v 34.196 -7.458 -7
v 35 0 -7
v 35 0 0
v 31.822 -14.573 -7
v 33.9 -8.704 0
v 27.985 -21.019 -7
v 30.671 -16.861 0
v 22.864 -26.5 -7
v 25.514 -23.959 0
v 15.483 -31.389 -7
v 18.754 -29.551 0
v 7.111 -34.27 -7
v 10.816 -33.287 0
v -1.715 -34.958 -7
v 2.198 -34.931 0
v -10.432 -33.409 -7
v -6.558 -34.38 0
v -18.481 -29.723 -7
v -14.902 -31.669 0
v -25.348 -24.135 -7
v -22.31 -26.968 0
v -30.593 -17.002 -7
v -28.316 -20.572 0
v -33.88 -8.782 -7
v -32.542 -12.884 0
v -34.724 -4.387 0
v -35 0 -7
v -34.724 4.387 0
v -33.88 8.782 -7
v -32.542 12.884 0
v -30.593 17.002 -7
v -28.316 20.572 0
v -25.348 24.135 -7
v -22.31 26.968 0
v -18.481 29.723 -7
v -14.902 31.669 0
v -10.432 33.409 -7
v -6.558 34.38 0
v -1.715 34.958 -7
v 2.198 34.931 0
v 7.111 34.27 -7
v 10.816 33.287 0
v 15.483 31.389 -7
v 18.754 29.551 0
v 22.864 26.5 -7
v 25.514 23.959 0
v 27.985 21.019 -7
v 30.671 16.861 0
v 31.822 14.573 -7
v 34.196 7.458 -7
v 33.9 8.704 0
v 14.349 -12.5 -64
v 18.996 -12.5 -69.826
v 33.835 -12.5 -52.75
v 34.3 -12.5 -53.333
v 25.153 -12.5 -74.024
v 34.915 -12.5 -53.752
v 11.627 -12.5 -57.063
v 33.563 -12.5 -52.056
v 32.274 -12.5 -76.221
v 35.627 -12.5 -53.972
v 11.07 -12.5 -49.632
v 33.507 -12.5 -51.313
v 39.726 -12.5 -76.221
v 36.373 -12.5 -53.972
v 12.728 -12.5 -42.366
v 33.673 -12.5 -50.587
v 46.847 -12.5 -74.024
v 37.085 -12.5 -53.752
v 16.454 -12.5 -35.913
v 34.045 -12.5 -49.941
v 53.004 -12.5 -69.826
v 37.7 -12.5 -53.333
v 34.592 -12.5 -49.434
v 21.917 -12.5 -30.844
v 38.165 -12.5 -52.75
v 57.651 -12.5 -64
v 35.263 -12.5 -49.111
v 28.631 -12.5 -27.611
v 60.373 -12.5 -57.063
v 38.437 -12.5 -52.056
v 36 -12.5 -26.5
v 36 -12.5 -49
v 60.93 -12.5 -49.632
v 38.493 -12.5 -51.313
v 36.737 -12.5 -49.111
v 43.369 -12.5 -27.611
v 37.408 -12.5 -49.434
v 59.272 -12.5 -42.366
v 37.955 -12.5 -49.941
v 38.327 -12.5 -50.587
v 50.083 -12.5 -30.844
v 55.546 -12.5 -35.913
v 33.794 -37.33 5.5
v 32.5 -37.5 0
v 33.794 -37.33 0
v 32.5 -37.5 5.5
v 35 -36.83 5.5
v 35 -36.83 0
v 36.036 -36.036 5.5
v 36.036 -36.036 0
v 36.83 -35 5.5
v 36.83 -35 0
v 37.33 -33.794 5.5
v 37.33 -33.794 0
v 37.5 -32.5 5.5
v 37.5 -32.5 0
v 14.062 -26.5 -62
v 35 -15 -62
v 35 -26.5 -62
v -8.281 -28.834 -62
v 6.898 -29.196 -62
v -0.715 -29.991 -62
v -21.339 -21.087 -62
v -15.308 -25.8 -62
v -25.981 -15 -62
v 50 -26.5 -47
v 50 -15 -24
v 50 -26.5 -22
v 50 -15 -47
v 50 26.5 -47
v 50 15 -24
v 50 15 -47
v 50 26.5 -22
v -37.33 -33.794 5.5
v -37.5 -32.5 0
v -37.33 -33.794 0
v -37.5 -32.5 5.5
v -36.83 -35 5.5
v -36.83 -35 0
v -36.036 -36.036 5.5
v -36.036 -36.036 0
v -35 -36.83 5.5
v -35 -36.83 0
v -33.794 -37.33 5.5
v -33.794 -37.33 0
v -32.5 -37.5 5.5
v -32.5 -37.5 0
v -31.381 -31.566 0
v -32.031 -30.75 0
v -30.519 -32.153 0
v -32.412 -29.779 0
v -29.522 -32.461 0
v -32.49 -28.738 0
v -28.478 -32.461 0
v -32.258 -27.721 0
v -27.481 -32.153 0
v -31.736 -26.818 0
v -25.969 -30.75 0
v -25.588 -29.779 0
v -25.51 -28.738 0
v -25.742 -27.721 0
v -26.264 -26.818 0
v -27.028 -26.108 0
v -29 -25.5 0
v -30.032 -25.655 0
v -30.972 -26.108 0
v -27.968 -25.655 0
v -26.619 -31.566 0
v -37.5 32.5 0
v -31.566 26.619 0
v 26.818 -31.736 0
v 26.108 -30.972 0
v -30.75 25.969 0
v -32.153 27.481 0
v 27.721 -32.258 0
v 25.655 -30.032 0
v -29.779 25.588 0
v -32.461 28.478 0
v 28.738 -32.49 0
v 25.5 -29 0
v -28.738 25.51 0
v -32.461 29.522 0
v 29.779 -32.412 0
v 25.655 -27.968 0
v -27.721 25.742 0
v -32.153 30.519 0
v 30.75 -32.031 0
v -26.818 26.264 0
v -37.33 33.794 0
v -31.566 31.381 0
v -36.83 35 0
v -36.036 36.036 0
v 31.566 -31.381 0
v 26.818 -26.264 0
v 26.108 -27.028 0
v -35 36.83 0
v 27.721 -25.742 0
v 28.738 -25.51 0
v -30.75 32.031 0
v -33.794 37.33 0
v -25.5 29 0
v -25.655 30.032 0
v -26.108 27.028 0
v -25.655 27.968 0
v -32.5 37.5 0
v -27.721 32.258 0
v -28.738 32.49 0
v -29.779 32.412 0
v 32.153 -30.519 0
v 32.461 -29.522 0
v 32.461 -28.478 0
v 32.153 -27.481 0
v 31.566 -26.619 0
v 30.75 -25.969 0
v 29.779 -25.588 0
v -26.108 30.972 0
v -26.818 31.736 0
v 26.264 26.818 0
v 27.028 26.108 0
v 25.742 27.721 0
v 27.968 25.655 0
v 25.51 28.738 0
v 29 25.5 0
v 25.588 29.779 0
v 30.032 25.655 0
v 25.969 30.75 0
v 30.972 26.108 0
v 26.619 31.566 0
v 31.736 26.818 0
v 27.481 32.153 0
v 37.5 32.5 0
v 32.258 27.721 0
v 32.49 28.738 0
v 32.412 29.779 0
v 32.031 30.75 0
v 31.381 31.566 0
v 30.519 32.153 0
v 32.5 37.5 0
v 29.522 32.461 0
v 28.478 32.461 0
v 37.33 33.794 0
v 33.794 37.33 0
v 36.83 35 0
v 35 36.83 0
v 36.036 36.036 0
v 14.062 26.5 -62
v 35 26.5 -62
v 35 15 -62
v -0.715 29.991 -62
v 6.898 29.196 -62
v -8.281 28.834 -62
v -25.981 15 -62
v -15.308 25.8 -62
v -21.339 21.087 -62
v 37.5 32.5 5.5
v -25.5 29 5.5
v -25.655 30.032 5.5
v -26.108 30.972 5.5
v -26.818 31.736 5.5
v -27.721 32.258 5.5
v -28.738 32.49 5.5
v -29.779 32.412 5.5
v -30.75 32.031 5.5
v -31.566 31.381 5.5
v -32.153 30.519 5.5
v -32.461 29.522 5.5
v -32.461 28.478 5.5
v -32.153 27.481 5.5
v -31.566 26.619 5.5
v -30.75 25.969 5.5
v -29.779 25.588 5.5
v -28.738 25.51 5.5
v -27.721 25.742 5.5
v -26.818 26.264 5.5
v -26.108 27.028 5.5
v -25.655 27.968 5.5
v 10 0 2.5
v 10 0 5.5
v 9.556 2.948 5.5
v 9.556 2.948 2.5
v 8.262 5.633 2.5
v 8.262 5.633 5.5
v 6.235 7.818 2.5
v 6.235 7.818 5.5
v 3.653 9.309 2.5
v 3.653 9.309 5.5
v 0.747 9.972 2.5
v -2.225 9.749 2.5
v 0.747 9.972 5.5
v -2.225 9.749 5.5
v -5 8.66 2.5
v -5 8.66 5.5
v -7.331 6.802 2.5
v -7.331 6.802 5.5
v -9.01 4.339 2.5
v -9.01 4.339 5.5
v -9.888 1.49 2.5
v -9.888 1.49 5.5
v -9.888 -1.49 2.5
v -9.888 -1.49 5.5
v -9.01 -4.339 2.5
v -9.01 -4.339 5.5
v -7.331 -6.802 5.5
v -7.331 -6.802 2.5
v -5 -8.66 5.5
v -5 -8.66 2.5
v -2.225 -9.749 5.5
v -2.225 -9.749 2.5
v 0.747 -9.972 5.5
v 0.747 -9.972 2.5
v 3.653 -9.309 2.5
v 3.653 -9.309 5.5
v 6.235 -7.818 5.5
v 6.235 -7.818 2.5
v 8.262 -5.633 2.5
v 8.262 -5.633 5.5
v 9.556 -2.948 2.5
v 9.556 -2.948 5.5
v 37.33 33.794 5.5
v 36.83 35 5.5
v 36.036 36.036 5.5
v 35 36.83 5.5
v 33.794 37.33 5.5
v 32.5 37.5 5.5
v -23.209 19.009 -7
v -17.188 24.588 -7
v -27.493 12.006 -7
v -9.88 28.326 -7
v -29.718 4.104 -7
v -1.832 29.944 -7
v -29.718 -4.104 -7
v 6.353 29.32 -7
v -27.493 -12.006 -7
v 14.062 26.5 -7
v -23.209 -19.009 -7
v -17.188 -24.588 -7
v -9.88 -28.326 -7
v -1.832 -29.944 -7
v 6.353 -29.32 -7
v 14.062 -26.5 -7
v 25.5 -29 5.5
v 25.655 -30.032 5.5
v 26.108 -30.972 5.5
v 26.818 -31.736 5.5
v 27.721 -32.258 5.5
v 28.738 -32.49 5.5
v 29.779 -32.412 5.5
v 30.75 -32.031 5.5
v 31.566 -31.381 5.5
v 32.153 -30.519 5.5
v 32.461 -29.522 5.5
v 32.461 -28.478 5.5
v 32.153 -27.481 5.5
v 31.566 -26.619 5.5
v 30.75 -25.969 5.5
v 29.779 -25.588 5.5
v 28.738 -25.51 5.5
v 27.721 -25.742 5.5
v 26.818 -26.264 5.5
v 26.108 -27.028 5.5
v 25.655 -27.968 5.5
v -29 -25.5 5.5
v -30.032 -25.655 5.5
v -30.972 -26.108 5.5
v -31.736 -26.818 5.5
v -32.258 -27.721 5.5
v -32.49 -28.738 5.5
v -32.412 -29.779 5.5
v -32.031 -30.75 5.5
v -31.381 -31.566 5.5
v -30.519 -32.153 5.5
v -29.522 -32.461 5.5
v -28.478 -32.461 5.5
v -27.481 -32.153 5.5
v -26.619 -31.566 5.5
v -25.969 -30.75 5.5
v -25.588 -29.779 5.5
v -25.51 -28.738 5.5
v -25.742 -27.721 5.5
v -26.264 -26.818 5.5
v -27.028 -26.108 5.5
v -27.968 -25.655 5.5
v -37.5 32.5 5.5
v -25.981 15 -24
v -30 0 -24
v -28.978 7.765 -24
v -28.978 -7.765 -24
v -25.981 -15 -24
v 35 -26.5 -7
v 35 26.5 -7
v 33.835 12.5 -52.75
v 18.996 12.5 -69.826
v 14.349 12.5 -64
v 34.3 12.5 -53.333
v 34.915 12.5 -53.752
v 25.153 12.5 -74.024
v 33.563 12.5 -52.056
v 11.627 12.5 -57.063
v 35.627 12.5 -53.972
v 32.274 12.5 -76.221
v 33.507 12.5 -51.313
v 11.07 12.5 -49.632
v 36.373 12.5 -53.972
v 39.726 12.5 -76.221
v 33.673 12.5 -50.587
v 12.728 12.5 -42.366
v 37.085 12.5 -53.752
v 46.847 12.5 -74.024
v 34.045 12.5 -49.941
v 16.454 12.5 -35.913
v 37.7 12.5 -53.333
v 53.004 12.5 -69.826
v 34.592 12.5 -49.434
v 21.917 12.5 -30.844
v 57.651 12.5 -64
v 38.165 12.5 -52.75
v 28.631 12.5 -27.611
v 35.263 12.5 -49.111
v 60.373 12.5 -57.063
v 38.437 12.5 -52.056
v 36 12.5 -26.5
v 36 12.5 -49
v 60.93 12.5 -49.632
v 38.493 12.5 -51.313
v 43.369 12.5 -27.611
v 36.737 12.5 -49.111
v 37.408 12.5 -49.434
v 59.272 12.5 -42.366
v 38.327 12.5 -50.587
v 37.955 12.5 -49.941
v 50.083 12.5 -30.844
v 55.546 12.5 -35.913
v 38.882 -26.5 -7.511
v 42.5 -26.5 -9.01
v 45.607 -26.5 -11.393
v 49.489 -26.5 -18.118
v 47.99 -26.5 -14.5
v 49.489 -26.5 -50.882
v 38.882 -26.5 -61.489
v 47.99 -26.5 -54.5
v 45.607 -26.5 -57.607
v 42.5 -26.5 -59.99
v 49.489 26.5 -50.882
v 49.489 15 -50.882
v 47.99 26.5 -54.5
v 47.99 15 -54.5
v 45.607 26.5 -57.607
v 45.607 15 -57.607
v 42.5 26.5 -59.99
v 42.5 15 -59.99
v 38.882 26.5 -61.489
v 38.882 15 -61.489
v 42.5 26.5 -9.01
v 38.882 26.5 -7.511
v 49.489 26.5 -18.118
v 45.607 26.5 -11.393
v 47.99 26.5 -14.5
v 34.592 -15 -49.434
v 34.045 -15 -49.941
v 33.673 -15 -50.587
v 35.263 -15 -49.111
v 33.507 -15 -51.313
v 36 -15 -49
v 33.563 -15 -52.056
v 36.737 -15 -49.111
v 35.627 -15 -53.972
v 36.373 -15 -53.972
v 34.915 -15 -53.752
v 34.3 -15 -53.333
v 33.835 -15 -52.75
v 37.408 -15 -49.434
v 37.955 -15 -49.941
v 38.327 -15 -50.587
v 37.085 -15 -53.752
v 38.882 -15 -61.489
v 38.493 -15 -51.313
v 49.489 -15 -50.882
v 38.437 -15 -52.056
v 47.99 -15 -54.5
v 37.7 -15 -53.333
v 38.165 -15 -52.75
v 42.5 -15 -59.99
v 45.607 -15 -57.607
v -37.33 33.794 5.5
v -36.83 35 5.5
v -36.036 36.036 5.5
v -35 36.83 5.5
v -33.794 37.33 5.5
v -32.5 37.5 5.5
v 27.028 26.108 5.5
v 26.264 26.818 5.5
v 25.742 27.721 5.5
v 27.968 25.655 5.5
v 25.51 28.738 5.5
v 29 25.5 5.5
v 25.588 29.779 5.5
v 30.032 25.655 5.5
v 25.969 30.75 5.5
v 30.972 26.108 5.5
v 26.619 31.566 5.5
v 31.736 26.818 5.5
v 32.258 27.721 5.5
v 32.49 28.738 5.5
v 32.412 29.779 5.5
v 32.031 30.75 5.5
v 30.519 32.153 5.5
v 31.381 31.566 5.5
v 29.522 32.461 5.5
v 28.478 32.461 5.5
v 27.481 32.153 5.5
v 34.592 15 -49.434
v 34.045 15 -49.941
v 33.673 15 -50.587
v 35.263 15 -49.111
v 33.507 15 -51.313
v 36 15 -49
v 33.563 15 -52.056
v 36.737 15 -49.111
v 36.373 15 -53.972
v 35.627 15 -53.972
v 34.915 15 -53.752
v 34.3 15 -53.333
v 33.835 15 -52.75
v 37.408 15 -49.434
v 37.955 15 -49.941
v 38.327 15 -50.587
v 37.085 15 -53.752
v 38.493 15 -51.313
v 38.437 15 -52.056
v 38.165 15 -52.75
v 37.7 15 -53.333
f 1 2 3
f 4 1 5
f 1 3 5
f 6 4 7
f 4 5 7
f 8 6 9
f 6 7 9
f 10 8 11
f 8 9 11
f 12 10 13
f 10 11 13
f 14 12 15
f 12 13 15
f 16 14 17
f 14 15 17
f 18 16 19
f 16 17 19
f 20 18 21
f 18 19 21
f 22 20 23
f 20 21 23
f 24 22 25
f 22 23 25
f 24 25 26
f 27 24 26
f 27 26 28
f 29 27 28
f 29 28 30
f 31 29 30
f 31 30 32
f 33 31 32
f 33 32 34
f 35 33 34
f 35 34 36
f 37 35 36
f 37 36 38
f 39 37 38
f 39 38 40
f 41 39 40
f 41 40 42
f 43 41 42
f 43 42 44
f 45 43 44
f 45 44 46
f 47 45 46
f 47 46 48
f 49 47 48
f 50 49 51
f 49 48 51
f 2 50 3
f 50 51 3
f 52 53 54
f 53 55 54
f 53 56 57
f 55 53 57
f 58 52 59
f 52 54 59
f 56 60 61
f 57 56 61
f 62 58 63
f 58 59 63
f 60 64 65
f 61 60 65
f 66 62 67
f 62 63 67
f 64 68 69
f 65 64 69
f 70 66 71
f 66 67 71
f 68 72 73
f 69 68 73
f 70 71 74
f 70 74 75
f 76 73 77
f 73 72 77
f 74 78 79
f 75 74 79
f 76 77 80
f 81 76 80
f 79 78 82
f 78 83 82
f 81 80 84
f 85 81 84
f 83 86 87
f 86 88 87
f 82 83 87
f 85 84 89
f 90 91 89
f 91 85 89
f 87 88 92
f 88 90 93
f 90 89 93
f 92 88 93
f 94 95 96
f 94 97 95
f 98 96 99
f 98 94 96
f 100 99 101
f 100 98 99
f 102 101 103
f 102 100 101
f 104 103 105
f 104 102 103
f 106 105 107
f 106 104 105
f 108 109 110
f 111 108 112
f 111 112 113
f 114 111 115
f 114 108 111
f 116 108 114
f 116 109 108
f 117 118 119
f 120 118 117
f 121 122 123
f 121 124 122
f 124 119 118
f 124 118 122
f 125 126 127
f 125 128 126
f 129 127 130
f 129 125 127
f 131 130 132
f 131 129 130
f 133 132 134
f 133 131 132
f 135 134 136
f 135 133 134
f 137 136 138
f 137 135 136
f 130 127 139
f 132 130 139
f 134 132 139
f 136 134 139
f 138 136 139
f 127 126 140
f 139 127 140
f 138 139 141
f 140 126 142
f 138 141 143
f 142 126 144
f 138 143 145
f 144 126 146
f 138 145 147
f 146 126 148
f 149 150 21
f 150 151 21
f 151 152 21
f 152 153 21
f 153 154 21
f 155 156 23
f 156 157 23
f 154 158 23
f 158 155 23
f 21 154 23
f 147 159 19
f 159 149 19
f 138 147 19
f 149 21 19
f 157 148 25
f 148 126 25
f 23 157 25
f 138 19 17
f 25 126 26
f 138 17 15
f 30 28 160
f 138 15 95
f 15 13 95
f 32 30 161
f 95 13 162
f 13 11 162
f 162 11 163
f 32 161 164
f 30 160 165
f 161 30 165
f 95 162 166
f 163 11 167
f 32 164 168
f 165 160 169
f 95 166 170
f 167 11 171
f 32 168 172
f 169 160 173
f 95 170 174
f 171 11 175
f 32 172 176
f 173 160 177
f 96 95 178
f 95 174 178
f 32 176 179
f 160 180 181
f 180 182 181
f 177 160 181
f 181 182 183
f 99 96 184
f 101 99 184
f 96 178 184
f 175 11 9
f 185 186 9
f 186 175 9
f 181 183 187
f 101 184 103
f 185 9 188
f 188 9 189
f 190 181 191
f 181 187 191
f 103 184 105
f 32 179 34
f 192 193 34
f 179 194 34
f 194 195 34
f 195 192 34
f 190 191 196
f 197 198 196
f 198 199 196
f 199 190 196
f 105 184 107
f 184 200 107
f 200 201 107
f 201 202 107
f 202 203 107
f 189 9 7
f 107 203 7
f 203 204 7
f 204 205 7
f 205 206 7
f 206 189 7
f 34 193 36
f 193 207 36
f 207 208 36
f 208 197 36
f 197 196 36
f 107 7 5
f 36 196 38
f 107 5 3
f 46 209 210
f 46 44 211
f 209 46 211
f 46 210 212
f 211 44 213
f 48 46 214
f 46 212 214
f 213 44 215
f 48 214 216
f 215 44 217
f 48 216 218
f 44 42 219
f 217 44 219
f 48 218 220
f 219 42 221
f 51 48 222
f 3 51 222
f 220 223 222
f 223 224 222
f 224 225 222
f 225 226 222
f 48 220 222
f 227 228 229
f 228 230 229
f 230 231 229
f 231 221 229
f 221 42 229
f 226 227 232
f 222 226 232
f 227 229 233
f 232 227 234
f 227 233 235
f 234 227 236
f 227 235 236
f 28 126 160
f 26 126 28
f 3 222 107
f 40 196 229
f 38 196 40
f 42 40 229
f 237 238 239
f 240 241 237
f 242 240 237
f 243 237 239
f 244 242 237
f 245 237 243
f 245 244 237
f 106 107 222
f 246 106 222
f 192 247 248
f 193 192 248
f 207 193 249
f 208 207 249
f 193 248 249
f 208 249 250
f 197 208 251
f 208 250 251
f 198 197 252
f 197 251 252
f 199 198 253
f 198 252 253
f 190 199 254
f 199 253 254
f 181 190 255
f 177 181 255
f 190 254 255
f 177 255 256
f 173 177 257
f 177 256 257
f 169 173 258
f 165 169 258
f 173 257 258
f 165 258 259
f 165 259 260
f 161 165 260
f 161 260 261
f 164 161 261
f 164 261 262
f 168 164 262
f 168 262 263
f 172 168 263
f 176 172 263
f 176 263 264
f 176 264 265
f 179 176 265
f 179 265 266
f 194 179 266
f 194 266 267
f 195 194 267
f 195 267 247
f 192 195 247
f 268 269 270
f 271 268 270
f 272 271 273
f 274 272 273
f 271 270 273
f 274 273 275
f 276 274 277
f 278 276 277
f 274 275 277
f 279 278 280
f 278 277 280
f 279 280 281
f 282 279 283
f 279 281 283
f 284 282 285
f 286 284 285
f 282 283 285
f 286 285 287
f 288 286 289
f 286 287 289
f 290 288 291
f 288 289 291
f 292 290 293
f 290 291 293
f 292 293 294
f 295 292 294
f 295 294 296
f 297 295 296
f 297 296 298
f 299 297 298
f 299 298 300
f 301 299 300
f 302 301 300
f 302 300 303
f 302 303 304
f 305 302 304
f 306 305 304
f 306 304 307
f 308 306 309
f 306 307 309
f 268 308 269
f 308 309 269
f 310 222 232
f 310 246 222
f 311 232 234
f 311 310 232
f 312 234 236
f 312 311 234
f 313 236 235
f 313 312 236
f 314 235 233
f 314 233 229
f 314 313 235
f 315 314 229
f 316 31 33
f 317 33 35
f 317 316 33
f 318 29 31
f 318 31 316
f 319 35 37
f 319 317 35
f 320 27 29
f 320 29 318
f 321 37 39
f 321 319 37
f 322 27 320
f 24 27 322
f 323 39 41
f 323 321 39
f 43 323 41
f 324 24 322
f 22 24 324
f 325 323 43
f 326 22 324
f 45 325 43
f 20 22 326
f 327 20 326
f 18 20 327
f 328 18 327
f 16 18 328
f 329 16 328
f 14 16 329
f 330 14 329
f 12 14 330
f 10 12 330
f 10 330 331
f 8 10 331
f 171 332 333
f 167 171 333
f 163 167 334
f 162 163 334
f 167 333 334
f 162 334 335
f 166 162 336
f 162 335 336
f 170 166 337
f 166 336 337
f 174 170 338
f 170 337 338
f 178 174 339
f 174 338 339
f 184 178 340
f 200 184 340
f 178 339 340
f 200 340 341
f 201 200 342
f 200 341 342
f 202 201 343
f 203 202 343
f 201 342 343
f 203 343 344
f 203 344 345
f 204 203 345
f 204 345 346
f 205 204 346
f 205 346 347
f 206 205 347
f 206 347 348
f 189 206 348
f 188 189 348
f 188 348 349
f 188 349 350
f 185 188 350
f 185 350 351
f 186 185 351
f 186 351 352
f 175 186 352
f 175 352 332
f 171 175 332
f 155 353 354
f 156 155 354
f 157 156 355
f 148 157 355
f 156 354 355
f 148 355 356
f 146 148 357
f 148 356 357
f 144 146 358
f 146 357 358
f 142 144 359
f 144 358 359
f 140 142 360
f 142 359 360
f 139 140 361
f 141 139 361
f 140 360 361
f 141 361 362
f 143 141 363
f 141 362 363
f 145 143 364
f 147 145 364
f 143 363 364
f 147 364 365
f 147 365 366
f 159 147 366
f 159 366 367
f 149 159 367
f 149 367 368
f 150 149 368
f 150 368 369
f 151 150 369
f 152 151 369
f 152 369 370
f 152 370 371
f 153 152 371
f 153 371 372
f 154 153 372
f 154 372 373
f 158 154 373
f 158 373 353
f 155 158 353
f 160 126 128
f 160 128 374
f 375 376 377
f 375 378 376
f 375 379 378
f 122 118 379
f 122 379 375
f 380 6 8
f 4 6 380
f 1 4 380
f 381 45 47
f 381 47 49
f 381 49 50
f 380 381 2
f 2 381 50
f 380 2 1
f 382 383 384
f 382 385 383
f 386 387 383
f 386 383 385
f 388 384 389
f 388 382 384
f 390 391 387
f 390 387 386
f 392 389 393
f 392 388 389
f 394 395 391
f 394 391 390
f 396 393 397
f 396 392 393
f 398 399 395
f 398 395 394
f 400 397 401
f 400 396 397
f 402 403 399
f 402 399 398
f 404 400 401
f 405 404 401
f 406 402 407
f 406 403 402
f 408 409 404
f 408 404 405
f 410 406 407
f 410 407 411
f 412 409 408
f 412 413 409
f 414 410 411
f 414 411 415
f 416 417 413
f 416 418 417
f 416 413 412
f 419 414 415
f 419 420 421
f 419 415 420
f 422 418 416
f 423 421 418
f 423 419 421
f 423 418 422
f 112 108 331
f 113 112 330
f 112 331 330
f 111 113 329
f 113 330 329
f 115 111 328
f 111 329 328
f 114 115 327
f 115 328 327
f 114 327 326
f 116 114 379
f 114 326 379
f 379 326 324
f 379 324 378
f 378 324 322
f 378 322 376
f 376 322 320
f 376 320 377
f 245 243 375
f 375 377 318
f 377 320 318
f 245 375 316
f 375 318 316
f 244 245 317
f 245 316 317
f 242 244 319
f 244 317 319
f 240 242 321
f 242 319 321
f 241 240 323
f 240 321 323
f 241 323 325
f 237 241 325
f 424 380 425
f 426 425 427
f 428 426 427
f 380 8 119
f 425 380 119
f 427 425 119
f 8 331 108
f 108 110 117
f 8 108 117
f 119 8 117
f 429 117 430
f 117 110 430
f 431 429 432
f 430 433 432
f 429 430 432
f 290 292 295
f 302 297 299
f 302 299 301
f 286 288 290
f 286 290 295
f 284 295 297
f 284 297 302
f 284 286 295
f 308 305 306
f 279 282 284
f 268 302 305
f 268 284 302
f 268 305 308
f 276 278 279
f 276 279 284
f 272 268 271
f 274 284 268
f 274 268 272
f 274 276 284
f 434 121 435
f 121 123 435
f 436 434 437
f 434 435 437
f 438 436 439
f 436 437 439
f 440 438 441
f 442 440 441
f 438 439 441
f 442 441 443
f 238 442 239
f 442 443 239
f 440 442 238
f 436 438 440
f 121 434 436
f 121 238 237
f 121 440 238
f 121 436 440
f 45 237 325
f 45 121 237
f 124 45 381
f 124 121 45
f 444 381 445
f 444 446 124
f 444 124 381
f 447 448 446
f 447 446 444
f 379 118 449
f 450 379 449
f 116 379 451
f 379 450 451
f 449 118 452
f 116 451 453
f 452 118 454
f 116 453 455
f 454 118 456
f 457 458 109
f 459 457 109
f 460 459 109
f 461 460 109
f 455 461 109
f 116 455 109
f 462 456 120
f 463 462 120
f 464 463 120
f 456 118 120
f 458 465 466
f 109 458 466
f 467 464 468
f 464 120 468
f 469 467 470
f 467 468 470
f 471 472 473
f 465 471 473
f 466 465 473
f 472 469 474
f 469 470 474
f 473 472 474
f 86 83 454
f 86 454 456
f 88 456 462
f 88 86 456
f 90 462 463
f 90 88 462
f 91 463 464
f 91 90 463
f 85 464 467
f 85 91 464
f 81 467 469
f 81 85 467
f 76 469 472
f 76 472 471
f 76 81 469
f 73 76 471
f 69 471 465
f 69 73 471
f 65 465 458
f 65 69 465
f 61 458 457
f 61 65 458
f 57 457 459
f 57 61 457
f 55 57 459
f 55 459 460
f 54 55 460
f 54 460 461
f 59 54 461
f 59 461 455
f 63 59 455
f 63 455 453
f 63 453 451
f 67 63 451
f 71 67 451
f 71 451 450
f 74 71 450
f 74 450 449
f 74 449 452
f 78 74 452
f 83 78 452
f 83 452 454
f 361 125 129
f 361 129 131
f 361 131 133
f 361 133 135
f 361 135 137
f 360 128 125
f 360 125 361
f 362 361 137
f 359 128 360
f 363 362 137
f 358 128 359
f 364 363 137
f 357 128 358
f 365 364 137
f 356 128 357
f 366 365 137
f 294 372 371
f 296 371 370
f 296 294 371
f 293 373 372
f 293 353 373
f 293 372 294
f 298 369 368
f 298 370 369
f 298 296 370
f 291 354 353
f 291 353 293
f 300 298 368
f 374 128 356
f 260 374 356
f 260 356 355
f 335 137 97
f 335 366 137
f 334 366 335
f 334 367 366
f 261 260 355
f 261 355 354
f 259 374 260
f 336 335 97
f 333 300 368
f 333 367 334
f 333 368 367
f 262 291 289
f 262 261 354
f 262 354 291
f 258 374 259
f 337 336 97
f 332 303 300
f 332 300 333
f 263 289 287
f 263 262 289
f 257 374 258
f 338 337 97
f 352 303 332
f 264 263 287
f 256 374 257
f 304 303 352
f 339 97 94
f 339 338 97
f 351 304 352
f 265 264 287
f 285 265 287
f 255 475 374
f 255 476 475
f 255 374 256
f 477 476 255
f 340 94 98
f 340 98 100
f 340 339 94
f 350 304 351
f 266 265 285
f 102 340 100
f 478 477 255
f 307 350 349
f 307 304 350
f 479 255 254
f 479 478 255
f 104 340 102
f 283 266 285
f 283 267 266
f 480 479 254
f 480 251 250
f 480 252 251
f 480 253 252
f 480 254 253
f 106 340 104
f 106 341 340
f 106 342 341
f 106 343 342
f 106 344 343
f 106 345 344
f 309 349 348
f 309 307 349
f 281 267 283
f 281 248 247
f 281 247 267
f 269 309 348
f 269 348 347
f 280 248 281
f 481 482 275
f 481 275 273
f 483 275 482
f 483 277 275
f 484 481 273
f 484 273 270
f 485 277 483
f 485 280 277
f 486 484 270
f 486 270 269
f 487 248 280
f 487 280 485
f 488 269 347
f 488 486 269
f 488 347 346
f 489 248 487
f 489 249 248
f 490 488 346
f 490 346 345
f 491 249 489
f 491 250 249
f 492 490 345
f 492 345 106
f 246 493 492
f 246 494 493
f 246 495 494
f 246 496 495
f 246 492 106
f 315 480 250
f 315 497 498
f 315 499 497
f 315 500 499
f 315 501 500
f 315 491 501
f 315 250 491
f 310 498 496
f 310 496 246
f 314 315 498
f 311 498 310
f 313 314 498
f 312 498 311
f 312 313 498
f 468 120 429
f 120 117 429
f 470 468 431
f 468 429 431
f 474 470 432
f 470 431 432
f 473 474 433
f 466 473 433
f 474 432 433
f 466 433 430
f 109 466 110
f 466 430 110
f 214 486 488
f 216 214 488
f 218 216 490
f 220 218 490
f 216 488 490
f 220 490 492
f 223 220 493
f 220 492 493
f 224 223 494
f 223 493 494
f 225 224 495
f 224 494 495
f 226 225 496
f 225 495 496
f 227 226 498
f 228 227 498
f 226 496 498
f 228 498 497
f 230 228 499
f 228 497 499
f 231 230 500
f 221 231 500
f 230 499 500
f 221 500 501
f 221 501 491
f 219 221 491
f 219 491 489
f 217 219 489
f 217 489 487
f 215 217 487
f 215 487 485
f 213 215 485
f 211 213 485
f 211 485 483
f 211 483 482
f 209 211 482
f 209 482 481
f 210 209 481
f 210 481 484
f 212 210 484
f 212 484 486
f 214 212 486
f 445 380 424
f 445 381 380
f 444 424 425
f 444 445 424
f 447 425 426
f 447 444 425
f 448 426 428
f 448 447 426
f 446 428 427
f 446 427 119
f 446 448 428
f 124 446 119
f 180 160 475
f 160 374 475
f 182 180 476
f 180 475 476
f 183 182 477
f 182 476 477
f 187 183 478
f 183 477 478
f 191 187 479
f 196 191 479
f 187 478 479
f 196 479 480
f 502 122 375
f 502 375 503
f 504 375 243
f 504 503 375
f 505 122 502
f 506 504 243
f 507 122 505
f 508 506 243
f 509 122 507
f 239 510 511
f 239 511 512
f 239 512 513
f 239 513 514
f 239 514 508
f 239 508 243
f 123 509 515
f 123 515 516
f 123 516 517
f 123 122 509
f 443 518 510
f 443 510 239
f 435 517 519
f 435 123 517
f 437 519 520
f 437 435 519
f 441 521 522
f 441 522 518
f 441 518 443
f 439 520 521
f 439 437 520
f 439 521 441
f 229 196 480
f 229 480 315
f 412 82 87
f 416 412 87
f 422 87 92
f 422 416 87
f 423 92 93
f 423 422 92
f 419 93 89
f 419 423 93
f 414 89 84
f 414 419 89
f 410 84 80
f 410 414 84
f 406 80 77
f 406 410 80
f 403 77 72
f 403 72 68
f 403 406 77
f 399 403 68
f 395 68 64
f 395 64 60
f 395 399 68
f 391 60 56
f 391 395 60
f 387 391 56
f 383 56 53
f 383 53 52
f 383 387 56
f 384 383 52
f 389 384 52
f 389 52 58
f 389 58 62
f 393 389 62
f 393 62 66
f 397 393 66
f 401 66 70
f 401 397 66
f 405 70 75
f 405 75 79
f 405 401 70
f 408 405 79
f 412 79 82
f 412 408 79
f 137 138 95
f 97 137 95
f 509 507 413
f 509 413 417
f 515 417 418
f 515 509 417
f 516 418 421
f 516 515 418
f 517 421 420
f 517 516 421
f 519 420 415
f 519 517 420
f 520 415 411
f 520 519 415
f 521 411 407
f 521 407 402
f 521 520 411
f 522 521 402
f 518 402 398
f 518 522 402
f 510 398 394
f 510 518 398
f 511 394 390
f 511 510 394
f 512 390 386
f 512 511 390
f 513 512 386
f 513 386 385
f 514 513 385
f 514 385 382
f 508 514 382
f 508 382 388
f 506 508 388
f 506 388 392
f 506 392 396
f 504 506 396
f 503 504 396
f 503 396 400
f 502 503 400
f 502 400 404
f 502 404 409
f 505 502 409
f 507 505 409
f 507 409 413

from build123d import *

# Parameters (mm, degrees)
SKETCH_1_W               = 75
SKETCH_1_H               = 75
EXTRUDE_1_DEPTH          = 5.5
FILLET_1_R               = 5
SKETCH_2_R               = 3.5
CUT_EXTRUDE_1_DEPTH      = 54.31744555
PATTERN_CIRCULAR_1_COUNT = 4
SKETCH_3_R               = 10
CUT_EXTRUDE_2_DEPTH      = 3
SKETCH_4_R               = 35
EXTRUDE_2_DEPTH          = 7
SKETCH_5_R               = 30
EXTRUDE_3_DEPTH          = 55
SKETCH_6_W               = 50
SKETCH_6_H               = 55
EXTRUDE_4_DEPTH          = 26.5
FILLET_2_R               = 15
SKETCH_7_W               = 38
SKETCH_7_H               = 30
CUT_EXTRUDE_3_DEPTH      = 114.606777967
SKETCH_9_R               = 25
EXTRUDE_5_DEPTH          = 12.5
EXTRUDE_6_REACH          = 118.916
SKETCH_8_R               = 2.5
FILLET_3_R               = 15


with BuildPart() as part:
    # 草图1 → 拉伸1 (new body)
    with BuildSketch(Plane.XY):
        Rectangle(SKETCH_1_W, SKETCH_1_H)
    extrude(amount=EXTRUDE_1_DEPTH)

    # 圆角1
    fillet_1_edges = [part.edges().sort_by_distance(p)[0] for p in [
        (-37.5, 37.5, 2.75),
        (37.5, 37.5, 2.75),
        (37.5, -37.5, 2.75),
        (-37.5, -37.5, 2.75),
    ]]
    fillet(fillet_1_edges, radius=FILLET_1_R)

    # 草图2 → 切除-拉伸1 (cut, through all)
    with BuildSketch(Plane.XY.offset(5.5)):
        with Locations((-29, 29)):
            Circle(SKETCH_2_R)
    cut_extrude_1 = extrude(amount=-CUT_EXTRUDE_1_DEPTH, mode=Mode.SUBTRACT)

    # 阵列(圆周)1: 切除-拉伸1 ×4 about axis
    pattern_circular_1_axis = Axis((0, 0, 0), (0, 0, 1))
    for i in range(1, PATTERN_CIRCULAR_1_COUNT):
        add(cut_extrude_1.rotate(pattern_circular_1_axis, i * 360 / PATTERN_CIRCULAR_1_COUNT), mode=Mode.SUBTRACT)

    # 草图3 → 切除-拉伸2 (cut)
    with BuildSketch(Plane.XY.offset(5.5)):
        Circle(SKETCH_3_R)
    extrude(amount=-CUT_EXTRUDE_2_DEPTH, mode=Mode.SUBTRACT)

    # 草图4 → 拉伸2 (add)
    with BuildSketch(Plane(origin=(0, 0, 0), x_dir=(-1, 0, 0), z_dir=(0, 0, -1))):
        with Locations(Location((0, 0, 0), (0, 0, 180))):
            Circle(SKETCH_4_R)
    extrude(amount=EXTRUDE_2_DEPTH)

    # 草图5 → 拉伸3 (add)
    with BuildSketch(Plane(origin=(0, 0, -7), x_dir=(-1, 0, 0), z_dir=(0, 0, -1))):
        Circle(SKETCH_5_R)
    extrude(amount=EXTRUDE_3_DEPTH)

    # 草图6 → 拉伸4 (add, symmetric)
    with BuildSketch(Plane(origin=(0, 0, 0), x_dir=(1, 0, 0), z_dir=(0, 1, 0))):
        with Locations((25, 34.5)):
            Rectangle(SKETCH_6_W, SKETCH_6_H)
    extrude(amount=EXTRUDE_4_DEPTH, both=True)

    # 圆角2
    fillet_2_edges = [part.edges().sort_by_distance(p)[0] for p in [
        (50, 0, -7),
    ]]
    fillet(fillet_2_edges, radius=FILLET_2_R - 0.0001)  # a hair under: the kernel refuses the full size

    # 草图7 → 切除-拉伸3 (cut, through all)
    with BuildSketch(Plane(origin=(50, 0, 0), x_dir=(0, 0, -1), z_dir=(1, 0, 0))):
        with Locations((43, 0)):
            Rectangle(SKETCH_7_W, SKETCH_7_H)
    extrude(amount=-CUT_EXTRUDE_3_DEPTH, mode=Mode.SUBTRACT)

    # 拉伸6: up to this face of the body (flat: up to its plane)
    extrude_6_end = Plane(part.part.faces().sort_by_distance((31.665133936, -26.5, -35.104709871))[0])
    # 草图8 → 拉伸6 (add, up to the picked face)
    with BuildSketch(Plane(origin=(0, 26.5, 0), x_dir=(1, 0, 0), z_dir=(0, 1, 0)), mode=Mode.PRIVATE) as extrude_6_sk1:
        with Locations(Location((36, 51.5, 0), (0, 0, 270))):
            Circle(SKETCH_8_R)
    extrude_6_tool1 = split(extrude(extrude_6_sk1.sketch, amount=-EXTRUDE_6_REACH, mode=Mode.PRIVATE), bisect_by=extrude_6_end, keep=Keep.BOTH, mode=Mode.PRIVATE)


with BuildPart() as body_2:
    # 草图9 → 拉伸5 (new, symmetric)
    with BuildSketch(Plane(origin=(0, 0, 0), x_dir=(1, 0, 0), z_dir=(0, 1, 0))):
        with Locations(Location((36, 51.5, 0), (0, 0, 270))):
            Circle(SKETCH_9_R)
    extrude(amount=EXTRUDE_5_DEPTH, both=True)


with BuildPart() as part_1:
    add(part.part)

    add(body_2.part)  # 拉伸6 merges body 2
    add(extrude_6_tool1.solids().sort_by(Axis((36, 26.5, -51.5), (0, -1, 0)))[0])

    # 圆角3
    fillet_3_edges = [part_1.edges().sort_by_distance(p)[0] for p in [
        (50, 20.75, -62),
        (50, -20.75, -62),
    ]]
    fillet(fillet_3_edges, radius=FILLET_3_R)


solid = part_1.part
